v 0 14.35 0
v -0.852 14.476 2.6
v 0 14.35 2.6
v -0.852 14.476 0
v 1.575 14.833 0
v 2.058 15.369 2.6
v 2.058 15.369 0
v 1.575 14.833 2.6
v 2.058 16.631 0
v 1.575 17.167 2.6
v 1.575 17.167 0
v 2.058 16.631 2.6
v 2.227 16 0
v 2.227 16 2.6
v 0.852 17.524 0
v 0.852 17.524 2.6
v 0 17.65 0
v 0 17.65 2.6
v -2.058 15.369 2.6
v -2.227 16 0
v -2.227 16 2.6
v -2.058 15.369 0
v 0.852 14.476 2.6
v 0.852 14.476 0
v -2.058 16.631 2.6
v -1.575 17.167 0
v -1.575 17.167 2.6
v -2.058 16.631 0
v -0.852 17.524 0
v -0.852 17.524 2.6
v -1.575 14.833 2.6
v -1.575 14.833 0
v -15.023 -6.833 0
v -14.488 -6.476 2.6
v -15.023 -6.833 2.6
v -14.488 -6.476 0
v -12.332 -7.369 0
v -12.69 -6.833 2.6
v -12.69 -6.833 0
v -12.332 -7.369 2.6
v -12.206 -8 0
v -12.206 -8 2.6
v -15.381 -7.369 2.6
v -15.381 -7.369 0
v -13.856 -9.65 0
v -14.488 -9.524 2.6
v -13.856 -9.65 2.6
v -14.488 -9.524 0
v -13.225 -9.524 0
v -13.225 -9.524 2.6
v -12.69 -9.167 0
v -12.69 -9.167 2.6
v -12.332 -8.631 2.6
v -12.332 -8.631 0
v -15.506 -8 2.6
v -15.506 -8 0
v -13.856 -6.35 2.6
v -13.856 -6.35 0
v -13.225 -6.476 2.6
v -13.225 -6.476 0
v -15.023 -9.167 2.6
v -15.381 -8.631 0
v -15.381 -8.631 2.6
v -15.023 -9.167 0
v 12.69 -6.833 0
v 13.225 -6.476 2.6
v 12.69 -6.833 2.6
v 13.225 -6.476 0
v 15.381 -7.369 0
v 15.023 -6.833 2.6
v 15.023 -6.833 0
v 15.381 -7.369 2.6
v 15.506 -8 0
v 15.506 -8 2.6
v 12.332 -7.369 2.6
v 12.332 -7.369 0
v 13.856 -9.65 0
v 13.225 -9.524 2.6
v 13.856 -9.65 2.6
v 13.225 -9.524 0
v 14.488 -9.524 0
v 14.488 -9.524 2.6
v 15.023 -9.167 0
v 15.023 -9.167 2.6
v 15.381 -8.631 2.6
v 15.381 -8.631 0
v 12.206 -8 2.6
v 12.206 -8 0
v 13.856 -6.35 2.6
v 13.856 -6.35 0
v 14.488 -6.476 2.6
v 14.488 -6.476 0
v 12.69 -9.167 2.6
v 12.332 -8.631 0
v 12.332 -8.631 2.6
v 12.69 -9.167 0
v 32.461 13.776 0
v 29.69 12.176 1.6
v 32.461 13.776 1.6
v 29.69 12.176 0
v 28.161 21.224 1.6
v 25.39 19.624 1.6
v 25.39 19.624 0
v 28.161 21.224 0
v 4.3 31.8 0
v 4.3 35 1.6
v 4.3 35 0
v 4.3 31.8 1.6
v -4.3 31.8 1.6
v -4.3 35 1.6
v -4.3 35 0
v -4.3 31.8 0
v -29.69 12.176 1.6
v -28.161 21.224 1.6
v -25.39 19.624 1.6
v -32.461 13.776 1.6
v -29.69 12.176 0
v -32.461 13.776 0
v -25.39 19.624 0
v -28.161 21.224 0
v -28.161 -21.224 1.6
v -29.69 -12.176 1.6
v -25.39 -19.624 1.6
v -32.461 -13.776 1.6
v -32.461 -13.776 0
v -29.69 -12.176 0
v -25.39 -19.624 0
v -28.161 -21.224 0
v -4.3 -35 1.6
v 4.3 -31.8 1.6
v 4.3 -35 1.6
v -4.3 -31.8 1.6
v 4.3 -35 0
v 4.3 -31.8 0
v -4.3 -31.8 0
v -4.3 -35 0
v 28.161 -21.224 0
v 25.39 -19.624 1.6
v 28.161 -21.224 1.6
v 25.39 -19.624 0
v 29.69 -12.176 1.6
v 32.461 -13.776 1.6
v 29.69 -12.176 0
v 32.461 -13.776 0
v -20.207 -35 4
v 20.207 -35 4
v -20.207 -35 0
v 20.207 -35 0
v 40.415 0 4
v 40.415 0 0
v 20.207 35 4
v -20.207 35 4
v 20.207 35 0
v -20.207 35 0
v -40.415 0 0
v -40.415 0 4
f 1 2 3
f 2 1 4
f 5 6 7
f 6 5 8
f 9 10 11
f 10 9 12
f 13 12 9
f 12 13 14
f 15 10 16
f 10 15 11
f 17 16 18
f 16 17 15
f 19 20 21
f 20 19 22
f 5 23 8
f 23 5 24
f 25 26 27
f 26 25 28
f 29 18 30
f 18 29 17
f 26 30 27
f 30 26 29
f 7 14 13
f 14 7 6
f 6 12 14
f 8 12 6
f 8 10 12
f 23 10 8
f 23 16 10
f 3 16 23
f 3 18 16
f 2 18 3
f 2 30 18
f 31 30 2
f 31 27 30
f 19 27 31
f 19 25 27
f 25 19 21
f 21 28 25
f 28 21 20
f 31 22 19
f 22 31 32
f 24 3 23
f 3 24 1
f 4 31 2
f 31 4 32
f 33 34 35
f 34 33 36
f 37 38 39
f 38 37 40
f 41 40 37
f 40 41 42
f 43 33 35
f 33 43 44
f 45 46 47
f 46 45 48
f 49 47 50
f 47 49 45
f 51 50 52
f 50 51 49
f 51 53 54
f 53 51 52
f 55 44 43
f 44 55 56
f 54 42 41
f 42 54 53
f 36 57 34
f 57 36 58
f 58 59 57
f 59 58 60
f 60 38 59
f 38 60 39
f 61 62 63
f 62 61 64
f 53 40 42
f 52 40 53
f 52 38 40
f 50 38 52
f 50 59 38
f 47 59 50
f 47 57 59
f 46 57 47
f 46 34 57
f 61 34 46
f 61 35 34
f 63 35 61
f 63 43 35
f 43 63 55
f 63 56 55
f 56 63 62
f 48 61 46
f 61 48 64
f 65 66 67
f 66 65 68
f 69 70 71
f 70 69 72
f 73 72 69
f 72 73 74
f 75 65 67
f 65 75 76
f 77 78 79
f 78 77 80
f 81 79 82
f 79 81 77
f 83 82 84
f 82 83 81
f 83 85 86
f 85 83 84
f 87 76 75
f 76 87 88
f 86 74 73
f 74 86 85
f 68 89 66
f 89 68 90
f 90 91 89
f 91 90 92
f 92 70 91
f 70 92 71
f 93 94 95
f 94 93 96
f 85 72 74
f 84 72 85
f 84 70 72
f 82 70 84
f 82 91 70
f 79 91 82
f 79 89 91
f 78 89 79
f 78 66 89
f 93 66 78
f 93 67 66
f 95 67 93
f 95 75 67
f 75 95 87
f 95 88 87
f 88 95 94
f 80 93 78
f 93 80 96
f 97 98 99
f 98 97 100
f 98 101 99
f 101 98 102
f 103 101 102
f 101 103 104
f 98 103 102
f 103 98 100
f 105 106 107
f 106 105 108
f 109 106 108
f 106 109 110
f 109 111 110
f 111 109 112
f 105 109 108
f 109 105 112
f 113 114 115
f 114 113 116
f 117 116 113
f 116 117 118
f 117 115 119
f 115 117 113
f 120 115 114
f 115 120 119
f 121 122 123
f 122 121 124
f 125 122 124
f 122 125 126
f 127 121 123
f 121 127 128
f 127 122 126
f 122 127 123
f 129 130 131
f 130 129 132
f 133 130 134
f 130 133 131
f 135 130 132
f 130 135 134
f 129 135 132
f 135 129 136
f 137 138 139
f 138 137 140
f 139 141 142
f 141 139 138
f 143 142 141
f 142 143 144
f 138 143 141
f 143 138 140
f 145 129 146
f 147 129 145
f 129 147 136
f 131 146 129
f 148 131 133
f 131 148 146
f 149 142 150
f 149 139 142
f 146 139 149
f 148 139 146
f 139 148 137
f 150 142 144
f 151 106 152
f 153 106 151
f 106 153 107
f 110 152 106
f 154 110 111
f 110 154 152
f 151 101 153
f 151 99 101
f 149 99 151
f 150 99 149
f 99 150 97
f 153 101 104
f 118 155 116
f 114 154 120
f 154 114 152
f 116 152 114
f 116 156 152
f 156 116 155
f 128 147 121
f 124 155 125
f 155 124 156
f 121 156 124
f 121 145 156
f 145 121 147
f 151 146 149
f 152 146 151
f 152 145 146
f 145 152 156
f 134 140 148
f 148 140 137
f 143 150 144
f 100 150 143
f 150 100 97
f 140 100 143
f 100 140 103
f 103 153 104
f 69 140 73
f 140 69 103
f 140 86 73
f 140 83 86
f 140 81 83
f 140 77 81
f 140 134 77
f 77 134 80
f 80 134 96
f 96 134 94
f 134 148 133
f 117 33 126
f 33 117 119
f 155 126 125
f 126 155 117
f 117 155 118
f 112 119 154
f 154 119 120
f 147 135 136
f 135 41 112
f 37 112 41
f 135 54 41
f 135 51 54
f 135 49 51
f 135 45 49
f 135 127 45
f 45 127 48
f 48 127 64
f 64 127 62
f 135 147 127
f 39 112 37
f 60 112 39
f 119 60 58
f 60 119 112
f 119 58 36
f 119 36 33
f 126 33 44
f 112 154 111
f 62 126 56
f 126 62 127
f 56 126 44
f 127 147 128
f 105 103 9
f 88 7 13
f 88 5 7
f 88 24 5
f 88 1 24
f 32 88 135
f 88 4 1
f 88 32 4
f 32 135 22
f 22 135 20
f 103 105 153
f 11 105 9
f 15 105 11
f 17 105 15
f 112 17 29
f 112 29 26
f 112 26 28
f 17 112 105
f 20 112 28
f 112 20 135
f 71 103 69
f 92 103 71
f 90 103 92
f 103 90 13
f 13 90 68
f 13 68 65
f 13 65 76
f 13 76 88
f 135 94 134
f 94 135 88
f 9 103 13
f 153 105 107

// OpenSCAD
// file: lib.scad
// Tax the Richmen — shared physical constants (millimetres).
// Edit these, then rebuild with scripts/build-printables.py.
// Clearances are provisional FDM allowances, not measured fit tolerances.

flat = 70;                 // hex across flats; also the centre-to-centre pitch
base_h = 4.0;
topper_flat = 66;          // leaves a 2 mm lip on the base
plate_h = 2.2;
peg_d = 3.0;
peg_h = 2.4;
hole_clearance = 0.30;     // diametral: hole = peg + this
hole_d = peg_d + hole_clearance;
hole_depth = 2.6;
peg_orbit = 16;
key_scale = 1.35;          // one peg is elongated so toppers cannot rotate

cover_clearance = 0.35;    // per side, around the topper
cover_wall = 1.3;
cover_inner_flat = topper_flat + 2 * cover_clearance;
cover_outer_flat = cover_inner_flat + 2 * cover_wall;
cover_inner_h = 5.8;
cover_roof = 1.4;
cover_h = cover_inner_h + cover_roof;

notch_width = 8.6;
notch_reach = 3.2;
notch_depth = 1.6;
clip_w = 8.2;
clip_d = 6.0;
clip_h = 1.35;

center_keep = 13;          // roads and pipes stop this far from each hex centre
road_len = flat - 2 * center_keep;
road_w = 9;
road_h = 2.3;
pipe_d = 5.0;
pipe_clearance = 0.35;     // diametral, coupling bore

flag_peg_d = 3.2;
flag_clearance = 0.30;
flag_hole_d = flag_peg_d + flag_clearance;
flag_peg_h = 4.0;
hat_peg_d = 2.6;
hat_hole_d = 2.95;

chip_d = 13.2;
chip_h = 2.0;
chip_orbit = 28;           // sits on a vertex axis, clear of the road corridors
chip_recess = 0.45;

eps = 0.08;

function circumradius(across_flats) = across_flats / sqrt(3);

module hex(across, h) {
    cylinder(h = h, r = circumradius(across), center = false, $fn = 6);
}

// Flat normals of this hex point at 30°, 90°, 150°… (neighbour / road directions).
module road_corridors(width, h = 30) {
    for (a = [30:60:330])
        rotate([0, 0, a])
            translate([-circumradius(flat) - 2, -width / 2, -2])
                cube([2 * circumradius(flat) + 4, width, h]);
}

module peg_at(x, y, key = false) {
    translate([x, y, -peg_h])
        scale([key ? key_scale : 1, 1, 1])
            cylinder(h = peg_h + 0.2, d = peg_d, $fn = 16);
}

module hole_at(x, y, key = false) {
    translate([x, y, -eps])
        scale([key ? key_scale : 1, 1, 1])
            cylinder(h = hole_depth + eps, d = hole_d, $fn = 16);
}

module topper_pegs() {
    peg_at(0, peg_orbit, true);
    peg_at(peg_orbit * cos(210), peg_orbit * sin(210), false);
    peg_at(peg_orbit * cos(330), peg_orbit * sin(330), false);
}

module base_holes() {
    hole_at(0, peg_orbit, true);
    hole_at(peg_orbit * cos(210), peg_orbit * sin(210), false);
    hole_at(peg_orbit * cos(330), peg_orbit * sin(330), false);
}

module edge_notches() {
    for (a = [30:60:330])
        rotate([0, 0, a - 90])
            translate([-notch_width / 2, flat / 2 - notch_reach, -eps])
                cube([notch_width, notch_reach + 0.6, notch_depth + eps]);
}

module chip_seat() {
    translate([chip_orbit, 0, plate_h - chip_recess])
        cylinder(h = chip_recess + eps, d = chip_d + 0.50, $fn = 32);
}

module raised_text(label, size = 4.2, h = 0.6) {
    linear_extrude(h)
        text(str(label), size = size, font = "Liberation Sans:style=Bold", halign = "center", valign = "center", $fn = 12);
}
// main file
// Tax the Richmen — printable component kit.
// Open in OpenSCAD and set `part` (and `num` for number chips), or pass -D from the build script.
// Every part is one reusable geometry. Player colour is filament, not a separate file.

include <lib.scad>

part = "hex_base";
num = 5;

module hex_base() {
    difference() {
        hex(flat, base_h);
        base_holes();
        edge_notches();
    }
}

module topper_blank(seat = true) {
    difference() {
        hex(topper_flat, plate_h);
        if (seat) chip_seat();
    }
    topper_pegs();
}

module topper_artwork() {
    difference() {
        hex(topper_flat, plate_h);
        // Paper-insert rebate, stopped short of the lip and the chip seat.
        translate([0, 0, plate_h - 0.35]) hex(topper_flat - 3.2, 0.35 + eps);
        chip_seat();
    }
    topper_pegs();
}

// Keeps relief out of the six road corridors and the number-chip seat.
module relief_mask(h = 12) {
    difference() {
        translate([0, 0, plate_h - 0.45]) hex(topper_flat, h);
        road_corridors(road_w + 2.4, h + 4);
        translate([chip_orbit, 0, plate_h - 1])
            cylinder(h = h + 4, d = chip_d + 3.2, $fn = 28);
    }
}

module clip_relief(feature_h = 8) {
    intersection() {
        translate([0, 0, -0.25]) children();
        relief_mask(feature_h);
    }
}

module topper_city() {
    topper_blank();
    clip_relief() {
        for (a = [60, 180, 300])
            rotate([0, 0, a])
                translate([16, -3.2, plate_h])
                    cube([9, 6.4, 1.5]);
        for (a = [60, 180, 300])
            rotate([0, 0, a])
                translate([22, -2.2, plate_h])
                    cube([5.2, 4.4, 2.6]);
    }
}

module topper_village() {
    topper_blank();
    clip_relief() {
        for (a = [60, 300]) {
            rotate([0, 0, a]) {
                translate([16, -2.6, plate_h]) cube([6.5, 5.2, 1.6]);
                hull() {
                    translate([15.4, -3.0, plate_h + 1.5]) cube([7.6, 6.0, 0.4]);
                    translate([18.6, -3.0, plate_h + 3.3]) cube([1.0, 6.0, 0.4]);
                }
            }
        }
        rotate([0, 0, 180])
            translate([18, 0, plate_h])
                cylinder(h = 2.4, d = 3.4, $fn = 12);
    }
}

module topper_mine() {
    topper_blank();
    clip_relief() {
        rotate([0, 0, 180]) {
            translate([14, -5, plate_h]) cube([12, 10, 1.3]);
            difference() {
                translate([16, -3.2, plate_h]) cube([6, 6.4, 2.4]);
                translate([15.2, -1.8, plate_h + 0.4]) cube([4, 3.6, 2.4]);
            }
        }
        for (a = [60, 300])
            rotate([0, 0, a])
                translate([20, 0, plate_h])
                    cylinder(h = 2.2, d1 = 7, d2 = 1.2, $fn = 8);
    }
}

module topper_port() {
    topper_blank();
    clip_relief() {
        for (a = [60, 180, 300])
            rotate([0, 0, a])
                translate([14, -1.1, plate_h])
                    cube([12, 2.2, 1.15]);
        rotate([0, 0, 180])
            translate([20, -2.4, plate_h])
                cube([4.5, 4.8, 2.2]);
    }
}

module topper_oil() {
    topper_blank();
    clip_relief() {
        rotate([0, 0, 180]) {
            translate([15, -4, plate_h]) cube([8, 8, 0.9]);
            translate([18.2, -0.5, plate_h]) cube([1.0, 1.0, 3.4]);
            translate([16.2, 2.4, plate_h]) cube([1.0, 1.0, 3.4]);
            translate([16.0, -0.8, plate_h + 3.0]) cube([4.6, 4.2, 0.7]);
        }
        for (a = [60, 300])
            rotate([0, 0, a])
                translate([20, 0, plate_h])
                    cylinder(h = 1.6, d = 4.2, $fn = 16);
    }
}

module topper_mountain() {
    topper_blank();
    clip_relief() {
        for (a = [60, 180, 300])
            rotate([0, 0, a])
                translate([19, 0, plate_h])
                    cylinder(h = 2.8, d1 = 8.5, d2 = 0.6, $fn = 7);
    }
}

// Water and the Tax Office are inaccessible, so relief may use the centre.
module topper_water() {
    difference() {
        hex(topper_flat, plate_h);
        for (y = [-12, -4, 4, 12])
            translate([-circumradius(topper_flat), y, plate_h - 0.35])
                cube([2 * circumradius(topper_flat), 1.1, 0.5]);
    }
    topper_pegs();
    for (y = [-8, 0, 8])
        translate([0, y, plate_h - 0.2])
            scale([1.6, 0.35, 0.25])
                cylinder(h = 2.4, d = 10, $fn = 20);
}

module topper_tax() {
    difference() {
        hex(topper_flat, plate_h);
    }
    topper_pegs();
    translate([-6, -5, plate_h]) cube([12, 10, 1.2]);
    translate([-4.2, -3.6, plate_h + 1.0]) cube([8.4, 7.2, 2.2]);
    translate([-5.2, -4.2, plate_h + 3.0]) cube([10.4, 2.0, 0.7]);
    for (x = [-3, 0, 3])
        translate([x - 0.45, -4.4, plate_h + 1.0])
            cube([0.9, 0.8, 2.2]);
}

module hidden_cover() {
    difference() {
        hex(cover_outer_flat, cover_h);
        translate([0, 0, -eps]) hex(cover_inner_flat, cover_inner_h + eps);
        // Identical finger scoop on every cover. It does not reveal the tile beneath.
        rotate([0, 0, 90])
            translate([-6, circumradius(cover_outer_flat) - 2.2, -eps])
                cube([12, 4, 2.2]);
    }
    // Shared centre rivet, the same on all eight covers.
    translate([0, 0, cover_h - 0.12]) cylinder(h = 0.85, d = 4.2, $fn = 16);
}

module hex_clip() {
    translate([-clip_w / 2, -clip_d / 2, 0]) cube([clip_w, clip_d, clip_h]);
}

module fit_calibration() {
    translate([-46, -10, 0]) cube([92, 20, 4.2]);
    // Production pegs. The bar is labelled beside the matching holes.
    translate([-36, 5, 4.2]) cylinder(h = peg_h, d = peg_d, $fn = 20);
    translate([-36, -5, 4.2])
        scale([key_scale, 1, 1])
            cylinder(h = peg_h, d = peg_d, $fn = 16);
    translate([-24, 0, 4.2]) cylinder(h = flag_peg_h, d = flag_peg_d, $fn = 20);
    // Topper-peg holes at three diametral clearances. The middle one is the design value.
    for (i = [0:2]) {
        c = [0.20, hole_clearance, 0.45][i];
        translate([-8 + i * 10, 5, -eps]) cylinder(h = 2.8 + eps, d = peg_d + c, $fn = 20);
        translate([-8 + i * 10, -1.2, 4.2]) raised_text([20, 30, 45][i], 2.6, 0.55);
    }
    for (i = [0:2]) {
        c = [0.20, flag_clearance, 0.45][i];
        translate([24 + i * 8, -5, -eps]) cylinder(h = 2.8 + eps, d = flag_peg_d + c, $fn = 20);
    }
    translate([-36, 0, 4.2]) raised_text("PEGS", 2.4, 0.5);
    translate([28, 2.2, 4.2]) raised_text("FLAG", 2.4, 0.5);
}

module road_segment() {
    translate([-road_len / 2, -road_w / 2, 0]) cube([road_len, road_w, road_h]);
    translate([-road_len / 2, -road_w / 2, 0]) cube([road_len, 0.9, road_h + 0.45]);
    translate([-road_len / 2, road_w / 2 - 0.9, 0]) cube([road_len, 0.9, road_h + 0.45]);
    for (x = [-18:3.6:18])
        for (y = [-2.4, 0, 2.4])
            translate([x, y, road_h - 0.25])
                cube([2.5, 2.2, 0.75], center = true);
    difference() {
        translate([road_len / 2 - 7, 0, road_h - 0.15]) cylinder(h = 1.3, d = 6.6, $fn = 20);
        translate([road_len / 2 - 7, 0, road_h - 0.7]) cylinder(h = 2.2, d = flag_hole_d, $fn = 16);
    }
}

module pipeline_straight() {
    translate([-road_len / 2, -4, 0]) cube([road_len, 8, 1.5]);
    translate([-road_len / 2, 0, 3.5]) rotate([0, 90, 0]) cylinder(h = road_len, d = pipe_d, $fn = 24);
    for (x = [-16:8:16])
        translate([x, 0, 3.5]) rotate([0, 90, 0]) cylinder(h = 1.3, d = pipe_d + 1.3, center = true, $fn = 20);
    // Valve fin, standing in the pipe so the piece prints without support.
    translate([0, 0, 3.2]) rotate([0, 90, 0]) cylinder(h = 1.2, d = 6.4, center = true, $fn = 16);
    translate([0, 0, 5.6]) cube([1.2, 1.2, 2.2], center = true);
}

module pipeline_coupling() {
    difference() {
        union() {
            translate([0, 0, 4]) rotate([0, 90, 0]) cylinder(h = 16, d = pipe_d + 2 * 1.45, center = true, $fn = 24);
            translate([-8, -4.2, 0]) cube([16, 8.4, 2.4]);
        }
        translate([0, 0, 4]) rotate([0, 90, 0]) cylinder(h = 18, d = pipe_d + pipe_clearance, center = true, $fn = 24);
    }
}

module flag_socket_block() {
    difference() {
        children();
        translate([0, 0, -eps]) cylinder(h = flag_peg_h + eps, d = flag_hole_d, $fn = 16);
    }
}

module establishment() {
    translate([-6, -4.5, 0]) cube([12, 9, 1.6]);
    translate([-4.2, -3.2, 1.4]) cube([8.4, 6.4, 2.8]);
    hull() {
        translate([-4.8, -3.6, 4.0]) cube([9.6, 7.2, 0.35]);
        translate([-0.45, -3.6, 5.8]) cube([0.9, 7.2, 0.35]);
    }
    difference() {
        translate([0, 0, 5.7]) cylinder(h = 1.6, d = 6.0, $fn = 20);
        translate([0, 0, 3.4]) cylinder(h = 4.2, d = flag_hole_d, $fn = 16);
    }
    translate([-1.3, -4.7, 1.4]) cube([2.6, 1.0, 2.0]);
}

module office() {
    difference() {
        union() {
            translate([-5.5, -4.5, 0]) cube([11, 9, 1.4]);
            translate([-4.6, -3.6, 1.2]) cube([9.2, 7.2, 10.5]);
            translate([-5.2, -4.0, 11.4]) cube([10.4, 8.0, 1.0]);
        }
        // Door and window recesses. They do not pierce the walls.
        translate([-1.3, -4.0, 1.2]) cube([2.6, 1.0, 3.6]);
        for (x = [-2.6, 1.2])
            translate([x, -4.0, 6.2]) cube([1.8, 0.7, 2.4]);
        for (z = [3.4:2.4:9.5])
            translate([-3.6, -3.85, z]) cube([7.2, 0.6, 0.4]);
    }
    difference() {
        translate([-2.2, -2.2, 12.2]) cube([4.4, 4.4, 1.6]);
        translate([0, 0, 9.6]) cylinder(h = 4.4, d = flag_hole_d, $fn = 16);
    }
}

module flag() {
    translate([-1.6, -0.9, 0]) cube([3.2, 1.8, flag_peg_h + 0.4]);
    translate([0, 0, flag_peg_h]) cylinder(h = 11, d = flag_peg_d, $fn = 16);
    hull() {
        translate([-0.8, -0.7, flag_peg_h + 3.0]) cube([1.6, 1.4, 6.4]);
        translate([7.6, -0.65, flag_peg_h + 6.2]) cube([1.3, 1.3, 1.4]);
    }
}

module flag_ship() {
    translate([-1.8, -1.0, 0]) cube([3.6, 2.0, flag_peg_h + 0.4]);
    translate([0, 0, flag_peg_h]) cylinder(h = 15, d = flag_peg_d, $fn = 16);
    hull() {
        translate([-0.9, -0.75, flag_peg_h + 3.6]) cube([1.8, 1.5, 8.6]);
        translate([11, -0.7, flag_peg_h + 8.0]) cube([1.5, 1.4, 1.6]);
    }
}

module steel_vault() {
    difference() {
        translate([-10, -8, 0]) cube([20, 16, 14]);
        // Engraved door, wheel and hinge leaves. Nothing projects past the faces.
        translate([-7.2, 6.5, 1.6]) cube([14.4, 2, 10.6]);
        translate([0, 9, 7.2]) rotate([90, 0, 0]) cylinder(h = 3, d = 5.4, $fn = 20);
        translate([0, 9, 7.2]) rotate([90, 0, 0]) cylinder(h = 3.4, d = 2.2, $fn = 16);
        for (z = [3.4, 10.2])
            translate([-8.6, 6.2, z]) cube([1.6, 2.2, 2.4]);
    }
    for (x = [-6, 6])
        for (y = [-5, 5])
            translate([x, y, 14]) cylinder(h = 0.6, d = 1.5, $fn = 10);
}

module number_chip(n) {
    cylinder(h = chip_h, d = chip_d, $fn = 40);
    translate([0, 0, chip_h - 0.02])
        raised_text(n, n >= 10 ? 5.0 : 6.0, 0.7);
    difference() {
        translate([0, 0, chip_h - 0.02]) cylinder(h = 0.55, d = chip_d, $fn = 40);
        translate([0, 0, chip_h - 0.2]) cylinder(h = 1, d = chip_d - 1.6, $fn = 40);
    }
}

module steel_coin() {
    cylinder(h = 1.7, d = 18, $fn = 48);
    difference() {
        translate([0, 0, 1.55]) cylinder(h = 0.6, d = 18, $fn = 48);
        translate([0, 0, 1.4]) cylinder(h = 1, d = 15.4, $fn = 40);
    }
    translate([0, 0, 1.6]) raised_text("1", 6.2, 0.65);
    for (a = [0:45:315])
        rotate([0, 0, a])
            translate([0, 6.6, 1.6])
                cylinder(h = 0.45, d = 1.3, $fn = 8);
}

module market_plinth() {
    translate([-6, -5, 0]) cube([12, 10, 1.6]);
}

module market_wood() {
    market_plinth();
    translate([-4.2, -3.2, 1.4]) cube([8.4, 6.4, 3.6]);
    hull() {
        translate([-4.8, -3.6, 4.8]) cube([9.6, 7.2, 0.35]);
        translate([-0.4, -3.6, 7.6]) cube([0.8, 7.2, 0.35]);
    }
    translate([0, -3.2, 3.4]) rotate([90, 0, 0]) cylinder(h = 1.2, d = 3.4, center = true, $fn = 16);
}

module market_metal() {
    market_plinth();
    translate([-4.4, -3.4, 1.4]) cube([7.2, 6.8, 4.2]);
    translate([1.6, -0.2, 5.4]) cylinder(h = 4.4, d = 3.0, $fn = 12);
    translate([-1.2, -3.6, 1.5]) cube([2.4, 0.8, 2.2]);
}

module market_fuel() {
    market_plinth();
    translate([-2.4, 0.4, 1.4]) cylinder(h = 6.6, d = 4.0, $fn = 16);
    translate([2.2, 0.6, 1.4]) cylinder(h = 5.2, d = 3.4, $fn = 16);
    translate([-0.7, -4.8, 1.4]) cube([1.5, 2.6, 3.6]);
    translate([-1.5, -4.9, 4.6]) cube([3.0, 1.2, 0.5]);
}

module market_stone() {
    market_plinth();
    translate([-5, -3.2, 1.4]) cube([5.5, 6.4, 3.4]);
    translate([0.8, -3.4, 1.4]) cube([4.4, 6.8, 1.0]);
    hull() {
        translate([1.2, -2.6, 2.3]) cube([3.6, 1.0, 2.4]);
        translate([1.2, 1.6, 2.3]) cube([0.5, 1.0, 0.7]);
    }
}

module lease_token() {
    translate([-10, -7, 0]) cube([20, 14, 1.7]);
    translate([-0.7, -0.65, 1.45]) cube([1.4, 1.3, 5.0]);
    translate([-2.6, -0.65, 4.7]) cube([5.2, 1.3, 0.9]);
    hull() {
        translate([-0.8, -0.7, 1.45]) cube([1.5, 1.4, 1.3]);
        translate([-3.5, -0.7, 1.45]) cube([1.4, 1.4, 1.0]);
    }
    hull() {
        translate([-0.8, -0.7, 1.45]) cube([1.5, 1.4, 1.3]);
        translate([2.2, -0.7, 1.45]) cube([1.4, 1.4, 1.0]);
    }
}

module bid_marker() {
    difference() {
        translate([-12, -8, 0]) cube([24, 16, 2.5]);
        translate([2, 0, 1.5]) cylinder(h = 1.2, d = 15.7, $fn = 32);
    }
    translate([-8, 0, 2.5]) raised_text("BID", 3.2, 0.55);
}

module tax_inspector() {
    cylinder(h = 2.2, d = 18, $fn = 32);
    translate([-2.4, -1.4, 1.7]) cube([2.7, 5.4, 2.3]);
    translate([0.3, -1.4, 1.7]) cube([2.7, 5.4, 2.3]);
    translate([-2.0, -0.7, 3.2]) cube([2.3, 3.5, 7.6]);
    translate([0.2, -0.7, 3.2]) cube([2.3, 3.5, 7.6]);
    translate([-4.3, -2.3, 9.8]) cube([8.8, 5.4, 9.2]);
    translate([-1.0, -2.6, 11.4]) cube([2.0, 0.9, 6.4]);
    translate([-2.3, -2.1, 18.2]) cube([4.6, 4.6, 1.5]);
    translate([0, 0.2, 19.2]) cylinder(h = 3.2, d = 3.3, $fn = 16);
    translate([0, 0.2, 21.6]) cylinder(h = 5.4, d = 5.6, $fn = 24);
    translate([0, 0.2, 26.6]) cylinder(h = 3.3, d = hat_peg_d, $fn = 16);
    translate([-5.5, -1.5, 14.2]) cube([2.1, 3.2, 6.2]);
    translate([-6.7, -2.5, 12.2]) cube([1.5, 4.8, 6.4]);
    translate([3.3, -1.5, 13.6]) cube([2.2, 3.2, 6.6]);
    translate([4.0, -3.5, 2.0]) cube([3.8, 2.6, 10.2]);
    translate([4.4, -3.8, 11.4]) cube([2.8, 0.9, 1.5]);
}

module inspector_hat() {
    difference() {
        union() {
            cylinder(h = 1.35, d = 13.4, $fn = 36);
            translate([0, 0, 0.9]) cylinder(h = 4.6, d = 7.3, $fn = 28);
            translate([0, 0, 5.1]) sphere(d = 7.1, $fn = 24);
        }
        translate([0, 0, -eps]) cylinder(h = 3.5, d = hat_hole_d, $fn = 16);
    }
}

module inspector_ring() {
    difference() {
        cylinder(h = 2.0, d = 19, $fn = 40);
        translate([0, 0, -eps]) cylinder(h = 2.3, d = 13.5, $fn = 36);
    }
}

module upgrade_token() {
    difference() {
        union() {
            cylinder(h = 2.0, d = 12, $fn = 28);
            for (a = [0:30:330])
                rotate([0, 0, a])
                    translate([5.2, -1.15, 0])
                        cube([2.8, 2.3, 2.0]);
        }
        translate([0, 0, -eps]) cylinder(h = 2.4, d = 3.6, $fn = 16);
    }
}

module winning_ship() {
    hull() {
        translate([-16, -5, 0]) cube([22, 10, 3.4]);
        translate([4, -3.4, 0]) cube([10, 6.8, 4.4]);
        translate([14, -1.2, 0]) cube([5, 2.4, 2.6]);
    }
    translate([-6, -2.2, 3.2]) cube([7.2, 4.4, 2.6]);
    translate([-2.2, -1.6, 3.4]) cube([3.2, 3.2, 0.8]);
    translate([-1.4, 0, 5.4]) cylinder(h = 4.0, d = 2.8, $fn = 14);
    translate([1.6, 0, 5.4]) cylinder(h = 3.2, d = 2.4, $fn = 14);
    difference() {
        translate([-17.2, -3.2, 2.6]) cube([6.6, 6.4, 3.6]);
        translate([-13.9, 0, 2.8]) cylinder(h = 3.8, d = flag_hole_d, $fn = 16);
    }
}

module resource_money() {
    cylinder(h = 1.7, d = 15, $fn = 40);
    difference() {
        translate([0, 0, 1.5]) cylinder(h = 0.5, d = 15, $fn = 40);
        translate([0, 0, 1.35]) cylinder(h = 0.9, d = 11.6, $fn = 32);
    }
    translate([0, 0, 1.55]) cylinder(h = 0.5, d = 5.2, $fn = 20);
    for (a = [0:45:315])
        rotate([0, 0, a])
            translate([0, 5.6, 1.55])
                cylinder(h = 0.4, d = 1.15, $fn = 8);
}

module resource_wood() {
    for (y = [-2.3, 0, 2.3])
        translate([-8, y, 1.9]) rotate([0, 90, 0]) cylinder(h = 16, d = 3.8, $fn = 14);
    translate([-1.2, -3.4, 1.2]) cube([2.4, 6.8, 1.2]);
}

module resource_metal() {
    hull() {
        translate([-7.5, -3.2, 0]) cube([15, 6.4, 2.0]);
        translate([-5.5, -2.2, 1.7]) cube([11, 4.4, 1.5]);
    }
}

module resource_fuel() {
    cylinder(h = 12, d = 8, $fn = 24);
    translate([0, 0, 1.6]) cylinder(h = 1.15, d = 8.8, $fn = 24);
    translate([0, 0, 9.2]) cylinder(h = 1.15, d = 8.8, $fn = 24);
    translate([0, 0, 12]) cylinder(h = 0.8, d = 2.4, $fn = 12);
}

module resource_stone() {
    difference() {
        translate([-6, -5, 0]) cube([12, 10, 8]);
        translate([-7, -0.45, 3.6]) cube([14, 0.9, 1.3]);
    }
}

module pip_at(x, y, z, nx, ny, nz) {
    translate([x, y, z])
        translate([nx, ny, nz] * 0.15)
            sphere(d = 2.35, $fn = 10);
}

module dice_d6() {
    s = 16;
    difference() {
        cube([s, s, s]);
        // +Z : 1    -Z : 6
        pip_at(s / 2, s / 2, s, 0, 0, 1);
        for (ix = [0:1])
            for (iy = [0:2])
                pip_at(4.2 + ix * 7.6, 3.2 + iy * 4.8, 0, 0, 0, -1);
        // +Y : 2    -Y : 5
        for (p = [[5.2, 5.2], [10.8, 10.8]])
            pip_at(p[0], s, p[1], 0, 1, 0);
        for (ix = [-1:1])
            for (iy = [-1:1])
                if (abs(ix) + abs(iy) != 1 || (ix == 0 && iy == 0))
                    pip_at(s / 2 + ix * 4.6, 0, s / 2 + iy * 4.6, 0, -1, 0);
        // +X : 3    -X : 4
        for (p = [[4.6, 4.6], [8, 8], [11.4, 11.4]])
            pip_at(s, p[0], p[1], 1, 0, 0);
        for (p = [[4.4, 4.4], [4.4, 11.6], [11.6, 4.4], [11.6, 11.6]])
            pip_at(0, p[0], p[1], -1, 0, 0);
    }
}

module card_holder() {
    difference() {
        translate([0, 0, 0]) cube([68, 20, 18]);
        translate([3.5, 4.5, 3.2]) cube([61, 11, 16]);
    }
}

module token_tray() {
    difference() {
        cube([96, 28, 10]);
        for (i = [0:4])
            translate([3.2 + i * 18.4, 2.6, 2.0]) cube([16.2, 22.8, 9]);
    }
}

color([0.62, 0.61, 0.58]) {
if (part == "hex_base") hex_base();
else if (part == "topper_artwork") topper_artwork();
else if (part == "topper_city") topper_city();
else if (part == "topper_village") topper_village();
else if (part == "topper_mine") topper_mine();
else if (part == "topper_port") topper_port();
else if (part == "topper_oil") topper_oil();
else if (part == "topper_mountain") topper_mountain();
else if (part == "topper_water") topper_water();
else if (part == "topper_tax") topper_tax();
else if (part == "hidden_cover") hidden_cover();
else if (part == "hex_clip") hex_clip();
else if (part == "fit_calibration") fit_calibration();
else if (part == "road_segment") road_segment();
else if (part == "pipeline_straight") pipeline_straight();
else if (part == "pipeline_coupling") pipeline_coupling();
else if (part == "establishment") establishment();
else if (part == "office") office();
else if (part == "flag") flag();
else if (part == "flag_ship") flag_ship();
else if (part == "steel_vault") steel_vault();
else if (part == "number_chip") number_chip(num);
else if (part == "steel_coin") steel_coin();
else if (part == "market_wood") market_wood();
else if (part == "market_metal") market_metal();
else if (part == "market_fuel") market_fuel();
else if (part == "market_stone") market_stone();
else if (part == "lease_token") lease_token();
else if (part == "bid_marker") bid_marker();
else if (part == "tax_inspector") tax_inspector();
else if (part == "inspector_hat") inspector_hat();
else if (part == "inspector_ring") inspector_ring();
else if (part == "upgrade_token") upgrade_token();
else if (part == "winning_ship") winning_ship();
else if (part == "resource_money") resource_money();
else if (part == "resource_wood") resource_wood();
else if (part == "resource_metal") resource_metal();
else if (part == "resource_fuel") resource_fuel();
else if (part == "resource_stone") resource_stone();
else if (part == "dice") dice_d6();
else if (part == "card_holder") card_holder();
else if (part == "token_tray") token_tray();
else echo("Unknown part", part);
}
